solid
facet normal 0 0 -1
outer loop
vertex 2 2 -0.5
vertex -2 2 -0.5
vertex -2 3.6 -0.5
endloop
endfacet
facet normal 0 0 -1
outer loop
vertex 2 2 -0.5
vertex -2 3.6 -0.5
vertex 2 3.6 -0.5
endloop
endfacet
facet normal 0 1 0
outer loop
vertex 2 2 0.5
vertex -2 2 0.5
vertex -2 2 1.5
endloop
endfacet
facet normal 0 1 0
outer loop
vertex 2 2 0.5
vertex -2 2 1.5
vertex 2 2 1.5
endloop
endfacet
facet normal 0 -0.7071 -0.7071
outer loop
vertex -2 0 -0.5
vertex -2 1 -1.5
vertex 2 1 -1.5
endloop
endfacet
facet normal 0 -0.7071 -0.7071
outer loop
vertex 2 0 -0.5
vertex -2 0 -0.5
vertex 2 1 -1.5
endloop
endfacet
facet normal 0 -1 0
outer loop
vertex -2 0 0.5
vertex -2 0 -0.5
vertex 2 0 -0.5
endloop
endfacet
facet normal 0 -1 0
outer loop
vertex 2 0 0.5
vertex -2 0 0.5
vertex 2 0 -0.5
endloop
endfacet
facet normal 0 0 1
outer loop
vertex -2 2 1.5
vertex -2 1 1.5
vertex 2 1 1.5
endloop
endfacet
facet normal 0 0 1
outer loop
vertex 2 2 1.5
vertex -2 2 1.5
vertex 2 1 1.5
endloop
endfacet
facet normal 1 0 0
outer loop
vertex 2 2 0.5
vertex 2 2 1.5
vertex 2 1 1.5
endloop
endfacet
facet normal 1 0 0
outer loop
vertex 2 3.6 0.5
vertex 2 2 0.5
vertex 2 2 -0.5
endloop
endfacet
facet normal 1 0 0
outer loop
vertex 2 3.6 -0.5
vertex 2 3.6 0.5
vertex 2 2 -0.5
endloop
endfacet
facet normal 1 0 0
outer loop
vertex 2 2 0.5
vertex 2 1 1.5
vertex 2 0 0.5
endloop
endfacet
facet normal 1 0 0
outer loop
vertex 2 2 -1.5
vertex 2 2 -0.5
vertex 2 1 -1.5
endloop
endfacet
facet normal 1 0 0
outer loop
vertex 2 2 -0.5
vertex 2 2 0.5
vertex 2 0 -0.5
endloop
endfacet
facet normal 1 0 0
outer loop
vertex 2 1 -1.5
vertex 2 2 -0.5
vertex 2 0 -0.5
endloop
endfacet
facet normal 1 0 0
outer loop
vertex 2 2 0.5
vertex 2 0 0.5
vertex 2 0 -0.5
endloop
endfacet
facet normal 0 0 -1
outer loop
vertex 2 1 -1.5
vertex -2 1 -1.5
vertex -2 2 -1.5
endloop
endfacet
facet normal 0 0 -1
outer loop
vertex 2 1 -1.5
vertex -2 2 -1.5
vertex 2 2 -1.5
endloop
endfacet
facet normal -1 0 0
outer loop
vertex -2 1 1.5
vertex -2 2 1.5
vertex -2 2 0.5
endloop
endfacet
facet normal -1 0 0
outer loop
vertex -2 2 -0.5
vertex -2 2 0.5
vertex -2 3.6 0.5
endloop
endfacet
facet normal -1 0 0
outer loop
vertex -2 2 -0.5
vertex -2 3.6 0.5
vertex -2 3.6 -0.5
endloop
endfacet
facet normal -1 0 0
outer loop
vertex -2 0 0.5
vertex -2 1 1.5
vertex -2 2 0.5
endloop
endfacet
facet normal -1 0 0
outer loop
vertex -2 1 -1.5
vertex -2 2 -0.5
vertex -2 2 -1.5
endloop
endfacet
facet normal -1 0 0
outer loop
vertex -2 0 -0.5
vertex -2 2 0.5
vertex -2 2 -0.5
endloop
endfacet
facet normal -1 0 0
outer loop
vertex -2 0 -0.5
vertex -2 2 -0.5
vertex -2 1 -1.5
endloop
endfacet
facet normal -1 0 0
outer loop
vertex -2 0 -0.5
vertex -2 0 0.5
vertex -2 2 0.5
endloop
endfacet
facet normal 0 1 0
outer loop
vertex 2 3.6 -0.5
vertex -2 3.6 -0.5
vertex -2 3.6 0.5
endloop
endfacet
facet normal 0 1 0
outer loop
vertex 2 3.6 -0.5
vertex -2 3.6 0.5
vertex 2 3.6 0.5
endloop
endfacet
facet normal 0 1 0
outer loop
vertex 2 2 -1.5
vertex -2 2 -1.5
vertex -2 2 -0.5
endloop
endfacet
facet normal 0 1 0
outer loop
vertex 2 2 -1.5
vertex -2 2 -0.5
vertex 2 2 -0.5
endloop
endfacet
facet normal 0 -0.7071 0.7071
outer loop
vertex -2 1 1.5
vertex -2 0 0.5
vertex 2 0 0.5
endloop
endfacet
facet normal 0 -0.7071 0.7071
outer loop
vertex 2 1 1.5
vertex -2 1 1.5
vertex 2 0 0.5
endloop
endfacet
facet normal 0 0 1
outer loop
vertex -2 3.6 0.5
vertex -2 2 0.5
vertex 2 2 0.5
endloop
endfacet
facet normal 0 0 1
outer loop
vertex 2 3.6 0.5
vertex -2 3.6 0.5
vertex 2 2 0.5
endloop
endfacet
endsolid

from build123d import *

# Parameters (mm, degrees)
SZKIC1_W                    = 4
SZKIC1_H                    = 3
DODANIE_WYCI_GNI_CIE1_DEPTH = 2
SZKIC3_W                    = 4
SZKIC3_H                    = 1
DODANIE_WYCI_GNI_CIE2_DEPTH = 1.6
SFAZOWANIE1_SIZE            = 1
SFAZOWANIE2_SIZE            = 1


with BuildPart() as part:
    # Szkic1 → Dodanie-wyciągnięcie1 (new body)
    with BuildSketch(Plane(origin=(0, 0, 0), x_dir=(1, 0, 0), z_dir=(0, 1, 0))):
        Rectangle(SZKIC1_W, SZKIC1_H)
    extrude(amount=DODANIE_WYCI_GNI_CIE1_DEPTH)

    # Szkic3 → Dodanie-wyciągnięcie2 (add)
    with BuildSketch(Plane(origin=(0, 2, 0), x_dir=(1, 0, 0), z_dir=(0, 1, 0))):
        Rectangle(SZKIC3_W, SZKIC3_H)
    extrude(amount=DODANIE_WYCI_GNI_CIE2_DEPTH)

    # Sfazowanie1
    sfazowanie1_edges = [part.edges().sort_by_distance(p)[0] for p in [
        (0, 0, 1.5),
    ]]
    chamfer(sfazowanie1_edges, length=SFAZOWANIE1_SIZE)

    # Sfazowanie2
    sfazowanie2_edges = [part.edges().sort_by_distance(p)[0] for p in [
        (0, 0, -1.5),
    ]]
    chamfer(sfazowanie2_edges, length=SFAZOWANIE2_SIZE)


solid = part.part
